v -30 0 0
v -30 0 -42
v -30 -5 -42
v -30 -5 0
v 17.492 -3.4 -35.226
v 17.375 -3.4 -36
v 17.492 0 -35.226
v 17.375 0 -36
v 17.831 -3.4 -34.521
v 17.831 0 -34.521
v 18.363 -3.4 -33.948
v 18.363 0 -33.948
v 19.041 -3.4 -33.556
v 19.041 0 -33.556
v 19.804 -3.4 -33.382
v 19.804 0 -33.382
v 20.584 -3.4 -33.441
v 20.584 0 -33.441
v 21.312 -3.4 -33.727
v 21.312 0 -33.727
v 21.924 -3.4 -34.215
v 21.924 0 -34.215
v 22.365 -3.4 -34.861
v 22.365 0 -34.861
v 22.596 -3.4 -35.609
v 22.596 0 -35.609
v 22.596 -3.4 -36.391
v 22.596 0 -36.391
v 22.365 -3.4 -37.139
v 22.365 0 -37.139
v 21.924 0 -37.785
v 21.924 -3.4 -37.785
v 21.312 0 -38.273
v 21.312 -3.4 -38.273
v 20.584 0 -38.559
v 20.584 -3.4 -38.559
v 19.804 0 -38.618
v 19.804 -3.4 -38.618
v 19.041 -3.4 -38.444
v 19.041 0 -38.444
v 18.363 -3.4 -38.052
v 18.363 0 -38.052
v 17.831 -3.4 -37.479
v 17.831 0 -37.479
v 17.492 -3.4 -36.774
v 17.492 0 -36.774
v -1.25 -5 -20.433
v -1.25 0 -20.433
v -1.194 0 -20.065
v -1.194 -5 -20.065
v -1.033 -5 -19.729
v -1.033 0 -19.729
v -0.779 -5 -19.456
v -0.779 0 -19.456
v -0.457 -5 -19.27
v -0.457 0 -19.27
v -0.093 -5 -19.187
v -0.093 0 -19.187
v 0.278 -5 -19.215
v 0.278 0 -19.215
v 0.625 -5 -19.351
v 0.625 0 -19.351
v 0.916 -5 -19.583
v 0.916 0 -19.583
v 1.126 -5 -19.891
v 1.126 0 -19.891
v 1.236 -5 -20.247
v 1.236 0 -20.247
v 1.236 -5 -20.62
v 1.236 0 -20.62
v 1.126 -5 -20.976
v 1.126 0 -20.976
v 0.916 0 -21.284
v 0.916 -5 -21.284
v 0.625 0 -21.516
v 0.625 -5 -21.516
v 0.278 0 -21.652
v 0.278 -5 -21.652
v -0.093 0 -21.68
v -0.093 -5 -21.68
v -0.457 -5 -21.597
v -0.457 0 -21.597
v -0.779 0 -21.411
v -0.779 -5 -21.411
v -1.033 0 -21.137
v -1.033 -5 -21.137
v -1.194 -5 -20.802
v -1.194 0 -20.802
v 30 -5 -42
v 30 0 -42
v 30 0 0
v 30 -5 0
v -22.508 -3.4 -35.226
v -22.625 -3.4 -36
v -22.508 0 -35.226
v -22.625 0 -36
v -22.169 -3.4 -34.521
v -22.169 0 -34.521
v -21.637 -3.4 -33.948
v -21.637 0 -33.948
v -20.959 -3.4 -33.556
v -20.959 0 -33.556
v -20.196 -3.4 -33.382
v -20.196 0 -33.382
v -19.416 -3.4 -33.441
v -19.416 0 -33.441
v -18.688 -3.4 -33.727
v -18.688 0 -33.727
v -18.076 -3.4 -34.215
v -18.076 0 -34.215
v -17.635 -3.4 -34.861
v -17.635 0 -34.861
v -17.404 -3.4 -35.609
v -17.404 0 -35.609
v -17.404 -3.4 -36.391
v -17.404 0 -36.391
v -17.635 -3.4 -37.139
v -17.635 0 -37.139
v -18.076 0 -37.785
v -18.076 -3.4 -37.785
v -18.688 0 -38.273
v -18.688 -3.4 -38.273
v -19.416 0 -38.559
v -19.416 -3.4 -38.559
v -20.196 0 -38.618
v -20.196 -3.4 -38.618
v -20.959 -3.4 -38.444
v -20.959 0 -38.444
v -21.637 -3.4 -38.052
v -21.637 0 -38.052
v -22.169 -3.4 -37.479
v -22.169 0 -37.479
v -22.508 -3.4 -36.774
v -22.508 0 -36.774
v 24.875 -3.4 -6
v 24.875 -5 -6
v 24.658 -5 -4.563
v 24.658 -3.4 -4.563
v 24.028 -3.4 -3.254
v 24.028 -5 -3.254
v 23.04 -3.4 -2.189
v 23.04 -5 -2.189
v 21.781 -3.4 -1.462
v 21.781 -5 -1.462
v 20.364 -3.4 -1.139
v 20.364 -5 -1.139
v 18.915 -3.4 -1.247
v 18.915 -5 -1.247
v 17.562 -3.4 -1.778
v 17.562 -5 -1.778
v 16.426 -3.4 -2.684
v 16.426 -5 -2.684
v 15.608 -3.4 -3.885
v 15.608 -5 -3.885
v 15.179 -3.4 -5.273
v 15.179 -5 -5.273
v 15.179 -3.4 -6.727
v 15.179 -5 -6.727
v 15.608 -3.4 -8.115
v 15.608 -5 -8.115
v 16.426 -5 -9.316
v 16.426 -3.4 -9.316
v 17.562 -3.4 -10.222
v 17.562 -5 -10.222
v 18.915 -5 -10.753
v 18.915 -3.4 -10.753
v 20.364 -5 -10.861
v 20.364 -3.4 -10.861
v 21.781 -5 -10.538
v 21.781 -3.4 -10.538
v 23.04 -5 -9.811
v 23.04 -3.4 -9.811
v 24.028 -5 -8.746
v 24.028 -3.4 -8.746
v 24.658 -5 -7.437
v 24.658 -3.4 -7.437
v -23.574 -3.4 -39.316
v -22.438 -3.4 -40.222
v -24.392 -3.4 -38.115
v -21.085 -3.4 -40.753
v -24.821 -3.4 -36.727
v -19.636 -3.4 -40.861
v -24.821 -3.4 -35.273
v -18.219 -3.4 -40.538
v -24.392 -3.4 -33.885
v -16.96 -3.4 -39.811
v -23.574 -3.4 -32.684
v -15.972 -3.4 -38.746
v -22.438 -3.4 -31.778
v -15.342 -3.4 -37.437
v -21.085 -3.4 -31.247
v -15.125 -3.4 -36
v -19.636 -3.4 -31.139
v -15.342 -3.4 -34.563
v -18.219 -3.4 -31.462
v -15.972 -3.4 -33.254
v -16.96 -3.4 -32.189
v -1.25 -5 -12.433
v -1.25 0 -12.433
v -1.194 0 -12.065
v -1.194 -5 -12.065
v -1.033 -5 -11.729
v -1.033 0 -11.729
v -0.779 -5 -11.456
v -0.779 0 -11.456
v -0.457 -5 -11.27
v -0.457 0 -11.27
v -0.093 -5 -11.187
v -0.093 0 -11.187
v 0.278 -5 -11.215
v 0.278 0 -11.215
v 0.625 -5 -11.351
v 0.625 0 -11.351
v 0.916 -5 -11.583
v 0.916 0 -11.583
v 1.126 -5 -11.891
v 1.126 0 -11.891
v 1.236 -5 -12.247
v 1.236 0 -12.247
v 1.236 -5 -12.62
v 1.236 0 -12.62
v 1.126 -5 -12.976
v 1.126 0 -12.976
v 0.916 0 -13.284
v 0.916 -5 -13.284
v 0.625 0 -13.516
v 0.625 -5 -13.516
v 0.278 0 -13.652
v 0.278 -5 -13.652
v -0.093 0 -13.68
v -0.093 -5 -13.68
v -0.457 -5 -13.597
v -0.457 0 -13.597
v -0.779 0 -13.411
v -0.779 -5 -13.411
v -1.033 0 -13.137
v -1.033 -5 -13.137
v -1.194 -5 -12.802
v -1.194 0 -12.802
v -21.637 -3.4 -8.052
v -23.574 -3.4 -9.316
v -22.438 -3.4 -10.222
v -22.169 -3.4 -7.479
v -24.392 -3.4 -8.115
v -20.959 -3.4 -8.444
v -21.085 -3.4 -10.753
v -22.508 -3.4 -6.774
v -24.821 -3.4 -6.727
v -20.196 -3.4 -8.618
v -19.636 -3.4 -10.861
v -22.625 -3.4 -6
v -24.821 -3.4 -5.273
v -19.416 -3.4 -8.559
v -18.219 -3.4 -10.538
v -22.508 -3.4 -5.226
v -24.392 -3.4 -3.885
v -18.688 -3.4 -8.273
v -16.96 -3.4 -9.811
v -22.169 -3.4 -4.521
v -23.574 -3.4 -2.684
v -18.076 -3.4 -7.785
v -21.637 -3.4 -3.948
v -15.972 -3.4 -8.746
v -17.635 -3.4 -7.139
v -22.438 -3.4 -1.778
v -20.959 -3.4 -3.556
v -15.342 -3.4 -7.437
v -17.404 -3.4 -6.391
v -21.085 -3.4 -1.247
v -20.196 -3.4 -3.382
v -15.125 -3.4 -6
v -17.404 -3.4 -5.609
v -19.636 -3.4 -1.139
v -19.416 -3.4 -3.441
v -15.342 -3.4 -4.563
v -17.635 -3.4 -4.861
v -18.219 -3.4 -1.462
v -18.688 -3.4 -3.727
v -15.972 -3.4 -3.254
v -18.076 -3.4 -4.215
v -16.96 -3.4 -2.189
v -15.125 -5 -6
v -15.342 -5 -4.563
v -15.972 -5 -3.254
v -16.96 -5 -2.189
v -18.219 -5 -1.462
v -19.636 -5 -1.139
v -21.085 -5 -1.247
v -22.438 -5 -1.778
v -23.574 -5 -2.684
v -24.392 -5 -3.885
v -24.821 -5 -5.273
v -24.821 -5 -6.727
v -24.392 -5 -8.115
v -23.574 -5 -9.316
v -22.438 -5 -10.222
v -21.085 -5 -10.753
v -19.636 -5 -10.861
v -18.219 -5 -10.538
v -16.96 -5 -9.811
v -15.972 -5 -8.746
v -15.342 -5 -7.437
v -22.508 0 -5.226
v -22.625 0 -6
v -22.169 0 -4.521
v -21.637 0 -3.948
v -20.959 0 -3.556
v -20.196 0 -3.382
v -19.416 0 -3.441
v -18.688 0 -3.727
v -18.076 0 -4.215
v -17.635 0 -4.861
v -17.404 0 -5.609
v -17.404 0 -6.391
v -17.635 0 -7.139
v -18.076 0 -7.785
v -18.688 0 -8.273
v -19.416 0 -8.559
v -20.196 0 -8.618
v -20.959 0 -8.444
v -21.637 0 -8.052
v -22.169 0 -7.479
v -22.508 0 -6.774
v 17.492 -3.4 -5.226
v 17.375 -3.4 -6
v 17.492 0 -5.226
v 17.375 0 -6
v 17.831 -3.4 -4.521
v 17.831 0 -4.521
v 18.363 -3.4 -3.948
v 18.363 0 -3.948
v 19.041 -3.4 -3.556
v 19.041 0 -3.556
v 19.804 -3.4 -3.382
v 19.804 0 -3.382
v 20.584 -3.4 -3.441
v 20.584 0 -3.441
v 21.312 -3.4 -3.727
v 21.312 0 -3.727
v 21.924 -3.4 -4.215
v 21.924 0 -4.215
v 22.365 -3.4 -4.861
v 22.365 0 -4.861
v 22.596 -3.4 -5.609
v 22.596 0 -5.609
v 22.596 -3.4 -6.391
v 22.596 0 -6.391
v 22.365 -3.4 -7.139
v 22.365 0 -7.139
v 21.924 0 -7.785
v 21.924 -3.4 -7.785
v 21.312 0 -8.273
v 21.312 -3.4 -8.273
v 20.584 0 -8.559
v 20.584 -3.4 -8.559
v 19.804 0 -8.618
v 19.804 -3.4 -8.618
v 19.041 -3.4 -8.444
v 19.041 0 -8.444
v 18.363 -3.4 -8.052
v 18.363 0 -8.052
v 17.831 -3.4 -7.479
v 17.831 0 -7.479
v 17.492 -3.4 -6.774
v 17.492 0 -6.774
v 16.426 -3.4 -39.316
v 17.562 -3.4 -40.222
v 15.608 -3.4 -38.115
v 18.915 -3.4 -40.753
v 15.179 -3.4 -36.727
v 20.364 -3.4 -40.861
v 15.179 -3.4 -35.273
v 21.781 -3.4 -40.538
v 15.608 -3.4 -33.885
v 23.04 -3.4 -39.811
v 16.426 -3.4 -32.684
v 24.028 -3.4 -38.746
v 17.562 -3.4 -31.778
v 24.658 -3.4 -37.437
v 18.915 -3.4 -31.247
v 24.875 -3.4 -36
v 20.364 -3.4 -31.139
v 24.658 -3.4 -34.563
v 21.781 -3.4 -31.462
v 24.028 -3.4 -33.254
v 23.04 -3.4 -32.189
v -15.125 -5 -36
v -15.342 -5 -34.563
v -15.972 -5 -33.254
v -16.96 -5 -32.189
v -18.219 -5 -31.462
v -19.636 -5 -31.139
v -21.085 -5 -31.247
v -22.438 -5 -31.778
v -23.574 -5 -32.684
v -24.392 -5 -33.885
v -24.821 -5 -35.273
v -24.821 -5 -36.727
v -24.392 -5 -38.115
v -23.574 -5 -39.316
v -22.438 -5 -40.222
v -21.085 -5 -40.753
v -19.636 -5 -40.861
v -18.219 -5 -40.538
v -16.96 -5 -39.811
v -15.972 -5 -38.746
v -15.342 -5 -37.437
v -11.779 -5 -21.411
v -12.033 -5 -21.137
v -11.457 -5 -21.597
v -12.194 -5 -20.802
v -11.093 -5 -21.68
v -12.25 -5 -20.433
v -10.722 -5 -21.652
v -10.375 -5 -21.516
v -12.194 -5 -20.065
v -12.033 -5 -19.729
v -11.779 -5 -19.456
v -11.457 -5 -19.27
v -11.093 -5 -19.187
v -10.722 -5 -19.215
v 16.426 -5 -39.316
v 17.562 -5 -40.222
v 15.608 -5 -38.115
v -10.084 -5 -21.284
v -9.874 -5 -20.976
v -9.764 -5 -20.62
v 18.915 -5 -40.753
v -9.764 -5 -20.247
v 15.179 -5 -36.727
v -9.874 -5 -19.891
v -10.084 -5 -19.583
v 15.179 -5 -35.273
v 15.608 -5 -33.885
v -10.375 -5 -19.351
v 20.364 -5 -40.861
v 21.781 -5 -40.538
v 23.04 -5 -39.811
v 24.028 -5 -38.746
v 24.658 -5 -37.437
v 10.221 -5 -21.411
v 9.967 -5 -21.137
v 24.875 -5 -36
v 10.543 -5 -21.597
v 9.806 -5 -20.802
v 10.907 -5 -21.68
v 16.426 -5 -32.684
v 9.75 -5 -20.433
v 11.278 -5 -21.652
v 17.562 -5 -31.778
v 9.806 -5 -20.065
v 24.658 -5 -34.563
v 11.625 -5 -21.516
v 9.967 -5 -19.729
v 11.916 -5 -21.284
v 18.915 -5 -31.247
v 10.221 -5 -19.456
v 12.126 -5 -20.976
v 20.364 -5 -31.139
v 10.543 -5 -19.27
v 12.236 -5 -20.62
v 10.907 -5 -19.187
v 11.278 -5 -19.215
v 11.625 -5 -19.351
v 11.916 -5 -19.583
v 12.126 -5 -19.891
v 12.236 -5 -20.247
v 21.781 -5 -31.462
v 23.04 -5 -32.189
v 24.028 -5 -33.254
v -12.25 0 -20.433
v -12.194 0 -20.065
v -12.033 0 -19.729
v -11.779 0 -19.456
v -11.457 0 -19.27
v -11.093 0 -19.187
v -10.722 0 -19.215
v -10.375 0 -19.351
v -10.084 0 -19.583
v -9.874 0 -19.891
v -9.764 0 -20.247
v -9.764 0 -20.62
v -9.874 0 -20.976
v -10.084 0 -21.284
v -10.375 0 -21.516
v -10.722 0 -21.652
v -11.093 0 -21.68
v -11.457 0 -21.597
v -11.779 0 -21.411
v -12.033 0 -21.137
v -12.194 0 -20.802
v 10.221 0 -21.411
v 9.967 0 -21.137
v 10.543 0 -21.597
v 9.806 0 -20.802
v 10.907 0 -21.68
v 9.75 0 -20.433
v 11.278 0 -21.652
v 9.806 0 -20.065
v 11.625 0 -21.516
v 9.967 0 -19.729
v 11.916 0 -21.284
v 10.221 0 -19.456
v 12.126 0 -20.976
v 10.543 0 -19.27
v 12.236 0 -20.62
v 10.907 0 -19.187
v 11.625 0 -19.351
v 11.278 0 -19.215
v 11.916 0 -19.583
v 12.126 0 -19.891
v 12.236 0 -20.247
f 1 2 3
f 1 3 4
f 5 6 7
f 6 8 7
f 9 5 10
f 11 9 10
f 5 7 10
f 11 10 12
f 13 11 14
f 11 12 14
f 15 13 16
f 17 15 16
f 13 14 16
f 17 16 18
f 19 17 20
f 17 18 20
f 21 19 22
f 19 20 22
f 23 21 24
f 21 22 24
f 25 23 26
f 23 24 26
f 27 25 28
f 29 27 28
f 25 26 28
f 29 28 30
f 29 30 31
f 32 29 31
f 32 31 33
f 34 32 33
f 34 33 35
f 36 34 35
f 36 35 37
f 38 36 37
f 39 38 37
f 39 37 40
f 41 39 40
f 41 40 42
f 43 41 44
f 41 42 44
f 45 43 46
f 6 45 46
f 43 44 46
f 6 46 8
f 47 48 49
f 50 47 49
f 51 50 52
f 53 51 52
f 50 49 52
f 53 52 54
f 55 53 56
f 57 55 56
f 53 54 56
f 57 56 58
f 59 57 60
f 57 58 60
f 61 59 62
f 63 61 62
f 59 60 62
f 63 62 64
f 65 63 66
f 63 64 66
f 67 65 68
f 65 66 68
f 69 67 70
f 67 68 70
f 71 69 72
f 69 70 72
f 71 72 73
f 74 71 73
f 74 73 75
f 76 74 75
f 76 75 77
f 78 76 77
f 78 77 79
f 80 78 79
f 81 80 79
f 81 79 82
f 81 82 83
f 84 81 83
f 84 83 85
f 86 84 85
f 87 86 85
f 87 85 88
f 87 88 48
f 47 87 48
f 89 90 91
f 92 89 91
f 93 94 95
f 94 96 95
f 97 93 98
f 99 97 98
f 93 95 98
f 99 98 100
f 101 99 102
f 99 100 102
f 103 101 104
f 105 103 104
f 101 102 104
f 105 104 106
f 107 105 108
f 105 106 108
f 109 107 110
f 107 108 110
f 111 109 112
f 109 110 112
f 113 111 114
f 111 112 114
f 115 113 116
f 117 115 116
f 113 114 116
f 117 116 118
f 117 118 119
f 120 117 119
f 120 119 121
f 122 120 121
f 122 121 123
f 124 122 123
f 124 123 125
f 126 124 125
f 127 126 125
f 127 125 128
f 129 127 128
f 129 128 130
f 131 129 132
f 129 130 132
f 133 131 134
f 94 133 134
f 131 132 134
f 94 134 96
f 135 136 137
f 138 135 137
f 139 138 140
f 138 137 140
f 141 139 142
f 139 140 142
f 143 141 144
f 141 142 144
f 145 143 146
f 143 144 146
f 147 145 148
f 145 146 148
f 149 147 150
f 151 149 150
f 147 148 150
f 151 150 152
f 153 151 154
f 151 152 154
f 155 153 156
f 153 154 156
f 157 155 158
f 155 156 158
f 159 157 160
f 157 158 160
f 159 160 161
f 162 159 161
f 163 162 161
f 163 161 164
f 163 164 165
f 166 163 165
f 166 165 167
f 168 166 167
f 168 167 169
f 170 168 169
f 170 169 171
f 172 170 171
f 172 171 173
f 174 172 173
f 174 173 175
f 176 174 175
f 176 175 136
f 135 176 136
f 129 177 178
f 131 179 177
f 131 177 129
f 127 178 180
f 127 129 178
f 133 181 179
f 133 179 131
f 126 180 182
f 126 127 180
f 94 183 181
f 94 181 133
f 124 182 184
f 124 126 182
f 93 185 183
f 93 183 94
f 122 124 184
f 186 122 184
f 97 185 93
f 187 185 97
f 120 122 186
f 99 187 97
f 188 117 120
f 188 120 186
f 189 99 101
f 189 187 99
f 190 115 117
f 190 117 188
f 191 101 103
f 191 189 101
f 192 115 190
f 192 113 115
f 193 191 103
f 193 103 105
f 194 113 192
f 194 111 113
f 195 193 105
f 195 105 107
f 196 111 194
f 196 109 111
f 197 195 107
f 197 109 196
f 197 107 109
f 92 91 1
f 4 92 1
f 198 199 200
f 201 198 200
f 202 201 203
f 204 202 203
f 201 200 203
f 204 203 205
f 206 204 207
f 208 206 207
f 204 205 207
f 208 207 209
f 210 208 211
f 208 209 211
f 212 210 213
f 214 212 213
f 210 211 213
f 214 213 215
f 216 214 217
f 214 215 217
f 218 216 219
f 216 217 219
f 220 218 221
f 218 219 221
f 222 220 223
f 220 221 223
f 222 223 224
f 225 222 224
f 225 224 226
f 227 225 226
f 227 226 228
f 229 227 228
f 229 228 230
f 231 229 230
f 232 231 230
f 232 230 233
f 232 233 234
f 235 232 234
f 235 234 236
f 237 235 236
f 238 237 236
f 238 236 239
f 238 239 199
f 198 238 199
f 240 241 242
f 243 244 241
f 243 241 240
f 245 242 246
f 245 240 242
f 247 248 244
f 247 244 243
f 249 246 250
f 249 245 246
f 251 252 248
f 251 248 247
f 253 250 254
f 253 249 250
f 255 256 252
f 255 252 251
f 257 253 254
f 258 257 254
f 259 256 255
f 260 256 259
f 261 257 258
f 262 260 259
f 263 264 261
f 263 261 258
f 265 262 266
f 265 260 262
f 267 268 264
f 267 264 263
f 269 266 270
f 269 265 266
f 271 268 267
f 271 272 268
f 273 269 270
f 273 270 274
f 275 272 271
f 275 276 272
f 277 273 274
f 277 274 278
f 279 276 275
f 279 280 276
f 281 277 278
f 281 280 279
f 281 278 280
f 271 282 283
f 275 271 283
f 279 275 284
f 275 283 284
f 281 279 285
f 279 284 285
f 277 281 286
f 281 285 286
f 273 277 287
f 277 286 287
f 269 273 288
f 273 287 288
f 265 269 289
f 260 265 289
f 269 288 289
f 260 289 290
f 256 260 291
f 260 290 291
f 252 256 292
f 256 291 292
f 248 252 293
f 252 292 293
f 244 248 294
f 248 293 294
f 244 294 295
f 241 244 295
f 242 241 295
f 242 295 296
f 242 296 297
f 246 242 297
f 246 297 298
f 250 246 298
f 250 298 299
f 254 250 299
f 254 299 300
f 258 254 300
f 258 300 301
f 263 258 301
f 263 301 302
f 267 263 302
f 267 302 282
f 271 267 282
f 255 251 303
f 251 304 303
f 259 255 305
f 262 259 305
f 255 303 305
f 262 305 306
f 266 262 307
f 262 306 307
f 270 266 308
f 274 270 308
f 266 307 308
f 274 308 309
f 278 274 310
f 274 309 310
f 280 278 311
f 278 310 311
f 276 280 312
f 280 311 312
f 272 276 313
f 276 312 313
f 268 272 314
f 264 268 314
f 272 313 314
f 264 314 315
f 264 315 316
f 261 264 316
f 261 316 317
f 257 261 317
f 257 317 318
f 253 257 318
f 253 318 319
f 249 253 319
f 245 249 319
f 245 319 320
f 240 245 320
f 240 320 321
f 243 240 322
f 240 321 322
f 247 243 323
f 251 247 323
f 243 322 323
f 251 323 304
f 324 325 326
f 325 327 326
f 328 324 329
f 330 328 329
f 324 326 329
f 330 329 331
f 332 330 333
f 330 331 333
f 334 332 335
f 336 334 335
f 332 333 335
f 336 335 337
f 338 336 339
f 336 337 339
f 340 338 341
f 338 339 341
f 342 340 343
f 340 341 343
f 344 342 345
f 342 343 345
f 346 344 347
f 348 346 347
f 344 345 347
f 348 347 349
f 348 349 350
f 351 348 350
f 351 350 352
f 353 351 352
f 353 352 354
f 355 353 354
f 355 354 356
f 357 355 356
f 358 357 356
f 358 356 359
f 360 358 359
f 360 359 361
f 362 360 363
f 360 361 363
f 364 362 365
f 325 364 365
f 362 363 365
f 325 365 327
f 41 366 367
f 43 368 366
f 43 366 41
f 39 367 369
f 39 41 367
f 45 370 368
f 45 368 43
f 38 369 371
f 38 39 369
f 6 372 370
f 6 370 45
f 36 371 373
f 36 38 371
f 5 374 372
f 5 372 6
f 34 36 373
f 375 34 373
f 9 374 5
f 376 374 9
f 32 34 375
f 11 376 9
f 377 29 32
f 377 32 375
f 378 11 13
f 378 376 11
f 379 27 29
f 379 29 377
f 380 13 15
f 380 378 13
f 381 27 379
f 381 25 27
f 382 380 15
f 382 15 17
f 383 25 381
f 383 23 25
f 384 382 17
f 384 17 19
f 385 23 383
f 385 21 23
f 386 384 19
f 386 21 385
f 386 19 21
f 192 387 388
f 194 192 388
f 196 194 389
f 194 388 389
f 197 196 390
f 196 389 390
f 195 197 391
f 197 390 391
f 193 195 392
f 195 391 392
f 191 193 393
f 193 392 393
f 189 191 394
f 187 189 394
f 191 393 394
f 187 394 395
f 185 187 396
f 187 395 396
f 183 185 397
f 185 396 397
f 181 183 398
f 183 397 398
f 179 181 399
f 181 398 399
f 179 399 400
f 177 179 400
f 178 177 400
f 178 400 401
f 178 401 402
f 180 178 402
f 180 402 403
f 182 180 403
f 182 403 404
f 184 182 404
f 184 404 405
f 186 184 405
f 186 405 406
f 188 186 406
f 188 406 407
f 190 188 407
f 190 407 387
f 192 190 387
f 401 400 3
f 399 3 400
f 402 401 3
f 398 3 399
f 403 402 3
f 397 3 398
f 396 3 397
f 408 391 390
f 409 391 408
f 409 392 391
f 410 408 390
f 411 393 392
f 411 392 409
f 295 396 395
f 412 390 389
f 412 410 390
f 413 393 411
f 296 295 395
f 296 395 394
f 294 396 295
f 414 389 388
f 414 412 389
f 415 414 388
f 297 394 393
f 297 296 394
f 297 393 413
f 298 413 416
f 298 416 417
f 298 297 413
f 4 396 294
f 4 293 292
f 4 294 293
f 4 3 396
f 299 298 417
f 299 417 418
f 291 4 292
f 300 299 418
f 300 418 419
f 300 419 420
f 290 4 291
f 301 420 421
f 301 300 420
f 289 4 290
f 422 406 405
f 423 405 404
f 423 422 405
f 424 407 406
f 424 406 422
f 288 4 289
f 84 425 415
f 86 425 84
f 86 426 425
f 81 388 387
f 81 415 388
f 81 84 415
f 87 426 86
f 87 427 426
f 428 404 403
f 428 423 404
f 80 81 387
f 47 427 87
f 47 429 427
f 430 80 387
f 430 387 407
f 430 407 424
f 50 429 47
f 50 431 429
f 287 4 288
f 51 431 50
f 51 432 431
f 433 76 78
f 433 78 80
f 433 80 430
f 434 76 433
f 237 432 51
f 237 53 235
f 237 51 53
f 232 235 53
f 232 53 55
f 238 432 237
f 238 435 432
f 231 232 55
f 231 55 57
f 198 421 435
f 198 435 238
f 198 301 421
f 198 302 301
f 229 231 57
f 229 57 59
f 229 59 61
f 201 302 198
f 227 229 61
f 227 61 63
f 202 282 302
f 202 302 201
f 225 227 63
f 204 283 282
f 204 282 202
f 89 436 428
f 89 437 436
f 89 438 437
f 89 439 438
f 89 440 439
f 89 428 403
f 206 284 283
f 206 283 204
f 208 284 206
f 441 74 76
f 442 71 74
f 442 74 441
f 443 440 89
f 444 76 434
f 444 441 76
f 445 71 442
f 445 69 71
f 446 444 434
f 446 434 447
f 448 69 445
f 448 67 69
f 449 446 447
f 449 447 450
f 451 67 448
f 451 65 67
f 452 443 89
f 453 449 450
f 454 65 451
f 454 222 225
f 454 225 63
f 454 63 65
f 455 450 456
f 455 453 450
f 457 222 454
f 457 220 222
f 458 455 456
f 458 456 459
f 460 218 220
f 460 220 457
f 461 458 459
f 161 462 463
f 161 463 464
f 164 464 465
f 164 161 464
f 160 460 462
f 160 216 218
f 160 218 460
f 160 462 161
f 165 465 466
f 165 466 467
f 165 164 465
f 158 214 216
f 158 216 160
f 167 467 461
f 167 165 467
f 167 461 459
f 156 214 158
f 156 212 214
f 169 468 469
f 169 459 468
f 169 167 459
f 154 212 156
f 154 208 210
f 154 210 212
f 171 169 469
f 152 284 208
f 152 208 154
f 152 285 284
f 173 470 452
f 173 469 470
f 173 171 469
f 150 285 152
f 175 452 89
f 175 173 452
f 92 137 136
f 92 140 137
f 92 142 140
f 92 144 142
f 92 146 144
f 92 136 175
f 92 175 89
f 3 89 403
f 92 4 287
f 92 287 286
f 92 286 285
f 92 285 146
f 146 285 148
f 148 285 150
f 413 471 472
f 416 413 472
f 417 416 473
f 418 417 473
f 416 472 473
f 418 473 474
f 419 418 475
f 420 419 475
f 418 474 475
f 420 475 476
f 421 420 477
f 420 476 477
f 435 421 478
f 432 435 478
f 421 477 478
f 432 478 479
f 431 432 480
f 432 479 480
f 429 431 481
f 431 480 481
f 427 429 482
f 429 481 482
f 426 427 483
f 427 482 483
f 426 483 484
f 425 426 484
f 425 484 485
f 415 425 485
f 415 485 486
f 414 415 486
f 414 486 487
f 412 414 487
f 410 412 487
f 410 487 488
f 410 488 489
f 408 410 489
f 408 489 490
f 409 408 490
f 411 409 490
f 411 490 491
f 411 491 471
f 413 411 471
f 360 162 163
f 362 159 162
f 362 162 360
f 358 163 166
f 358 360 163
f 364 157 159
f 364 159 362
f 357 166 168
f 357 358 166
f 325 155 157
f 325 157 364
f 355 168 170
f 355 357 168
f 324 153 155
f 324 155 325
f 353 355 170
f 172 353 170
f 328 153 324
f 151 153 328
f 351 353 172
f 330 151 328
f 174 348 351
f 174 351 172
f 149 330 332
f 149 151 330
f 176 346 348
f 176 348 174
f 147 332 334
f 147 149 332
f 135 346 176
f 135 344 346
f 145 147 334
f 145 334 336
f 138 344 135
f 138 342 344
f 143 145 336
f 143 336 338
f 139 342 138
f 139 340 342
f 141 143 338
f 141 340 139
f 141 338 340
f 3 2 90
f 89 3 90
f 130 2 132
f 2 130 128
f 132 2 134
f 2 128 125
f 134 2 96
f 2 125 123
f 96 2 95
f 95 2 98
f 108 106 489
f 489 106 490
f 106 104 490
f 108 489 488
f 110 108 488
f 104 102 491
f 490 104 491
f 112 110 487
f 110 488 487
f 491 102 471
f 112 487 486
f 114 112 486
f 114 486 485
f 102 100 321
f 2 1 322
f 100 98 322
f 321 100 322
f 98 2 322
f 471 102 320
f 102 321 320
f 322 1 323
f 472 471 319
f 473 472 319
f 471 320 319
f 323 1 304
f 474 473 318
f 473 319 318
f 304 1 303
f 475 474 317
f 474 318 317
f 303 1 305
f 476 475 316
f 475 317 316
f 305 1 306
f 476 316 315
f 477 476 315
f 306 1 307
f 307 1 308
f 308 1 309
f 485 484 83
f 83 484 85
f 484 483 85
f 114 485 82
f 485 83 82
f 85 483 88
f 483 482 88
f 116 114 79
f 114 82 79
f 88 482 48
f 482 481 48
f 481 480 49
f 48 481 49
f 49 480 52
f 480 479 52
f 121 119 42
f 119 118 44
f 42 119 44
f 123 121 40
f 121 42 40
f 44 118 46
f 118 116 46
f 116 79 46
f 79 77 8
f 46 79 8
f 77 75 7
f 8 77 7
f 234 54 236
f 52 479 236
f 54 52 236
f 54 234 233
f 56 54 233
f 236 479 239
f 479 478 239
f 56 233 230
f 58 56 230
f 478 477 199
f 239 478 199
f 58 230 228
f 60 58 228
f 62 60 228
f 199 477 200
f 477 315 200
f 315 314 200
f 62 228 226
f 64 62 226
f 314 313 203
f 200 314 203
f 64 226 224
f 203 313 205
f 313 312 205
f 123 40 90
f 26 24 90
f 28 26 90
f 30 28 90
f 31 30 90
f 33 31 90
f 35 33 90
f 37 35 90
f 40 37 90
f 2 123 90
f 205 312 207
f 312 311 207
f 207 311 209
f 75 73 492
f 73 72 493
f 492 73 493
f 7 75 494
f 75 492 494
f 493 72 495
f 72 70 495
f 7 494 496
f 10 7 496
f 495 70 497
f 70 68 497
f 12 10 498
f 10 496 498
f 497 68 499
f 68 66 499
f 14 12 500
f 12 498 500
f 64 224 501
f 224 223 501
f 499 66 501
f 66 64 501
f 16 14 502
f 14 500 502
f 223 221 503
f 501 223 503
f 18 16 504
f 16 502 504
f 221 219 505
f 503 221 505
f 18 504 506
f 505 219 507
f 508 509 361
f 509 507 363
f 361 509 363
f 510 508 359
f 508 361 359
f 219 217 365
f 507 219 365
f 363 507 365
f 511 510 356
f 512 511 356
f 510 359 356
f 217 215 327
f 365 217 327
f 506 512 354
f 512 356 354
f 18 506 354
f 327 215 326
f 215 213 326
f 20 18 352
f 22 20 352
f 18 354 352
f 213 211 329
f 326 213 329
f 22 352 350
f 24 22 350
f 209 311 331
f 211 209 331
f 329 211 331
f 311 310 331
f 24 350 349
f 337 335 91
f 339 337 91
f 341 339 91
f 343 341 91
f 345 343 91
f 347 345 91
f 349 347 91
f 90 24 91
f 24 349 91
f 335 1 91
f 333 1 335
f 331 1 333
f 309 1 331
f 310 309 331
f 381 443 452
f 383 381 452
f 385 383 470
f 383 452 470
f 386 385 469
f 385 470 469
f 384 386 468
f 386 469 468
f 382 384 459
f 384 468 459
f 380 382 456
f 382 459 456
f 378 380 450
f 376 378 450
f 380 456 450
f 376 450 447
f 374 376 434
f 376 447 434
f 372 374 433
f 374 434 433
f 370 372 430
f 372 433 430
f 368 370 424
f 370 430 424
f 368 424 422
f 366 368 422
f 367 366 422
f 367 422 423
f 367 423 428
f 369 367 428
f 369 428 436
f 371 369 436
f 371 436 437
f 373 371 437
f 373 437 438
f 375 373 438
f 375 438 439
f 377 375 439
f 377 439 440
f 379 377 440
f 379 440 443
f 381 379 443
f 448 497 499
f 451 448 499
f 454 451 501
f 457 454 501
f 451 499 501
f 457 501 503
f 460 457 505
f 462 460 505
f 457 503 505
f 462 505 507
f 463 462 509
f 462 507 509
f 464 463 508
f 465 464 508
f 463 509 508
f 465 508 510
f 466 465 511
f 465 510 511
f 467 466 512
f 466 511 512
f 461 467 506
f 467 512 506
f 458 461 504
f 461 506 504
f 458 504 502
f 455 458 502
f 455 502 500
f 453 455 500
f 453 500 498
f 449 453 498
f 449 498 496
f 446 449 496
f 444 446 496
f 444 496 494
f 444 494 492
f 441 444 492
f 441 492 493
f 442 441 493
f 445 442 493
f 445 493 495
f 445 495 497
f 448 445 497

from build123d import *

# Parameters (mm, degrees)
F0_W           = 11.5
F0_H           = 42
F0_W_2         = 37
F1_DEPTH       = 5
F3_D           = 5.25
F3_DEPTH       = 50
F3_CBORE_D     = 9.75
F3_CBORE_DEPTH = 1.6
F3_TIP         = 1.5772591249
F4_D           = 2.5


with BuildPart() as f1:
    # F0 (on Front) → F1 (new body)
    with BuildSketch(Plane.XZ):
        with Locations((-24.25, -21)):
            Rectangle(F0_W, F0_H)
        with Locations((0, -21)):
            Rectangle(F0_W_2, F0_H)
        with Locations((24.25, -21)):
            Rectangle(F0_W, F0_H)
    extrude(amount=F1_DEPTH)

    # F3
    with Locations(Plane.XZ.offset(5)):
        with Locations((-20, -6), (20, -6), (20, -36), (-20, -36)):
            CounterBoreHole(F3_D / 2, F3_CBORE_D / 2, F3_CBORE_DEPTH, depth=F3_DEPTH)
            with Locations((0, 0, -(F3_DEPTH + F3_TIP / 2))):  # 118° drill point
                Cone(0, F3_D / 2, F3_TIP, mode=Mode.SUBTRACT)

    # F4 (through all)
    with Locations(Plane.XZ.offset(5)):
        with Locations((0, -12.4333016574), (0, -20.4333016574), (-11, -20.4333016574), (11, -20.4333016574)):
            Hole(F4_D / 2)


solid = f1.part
